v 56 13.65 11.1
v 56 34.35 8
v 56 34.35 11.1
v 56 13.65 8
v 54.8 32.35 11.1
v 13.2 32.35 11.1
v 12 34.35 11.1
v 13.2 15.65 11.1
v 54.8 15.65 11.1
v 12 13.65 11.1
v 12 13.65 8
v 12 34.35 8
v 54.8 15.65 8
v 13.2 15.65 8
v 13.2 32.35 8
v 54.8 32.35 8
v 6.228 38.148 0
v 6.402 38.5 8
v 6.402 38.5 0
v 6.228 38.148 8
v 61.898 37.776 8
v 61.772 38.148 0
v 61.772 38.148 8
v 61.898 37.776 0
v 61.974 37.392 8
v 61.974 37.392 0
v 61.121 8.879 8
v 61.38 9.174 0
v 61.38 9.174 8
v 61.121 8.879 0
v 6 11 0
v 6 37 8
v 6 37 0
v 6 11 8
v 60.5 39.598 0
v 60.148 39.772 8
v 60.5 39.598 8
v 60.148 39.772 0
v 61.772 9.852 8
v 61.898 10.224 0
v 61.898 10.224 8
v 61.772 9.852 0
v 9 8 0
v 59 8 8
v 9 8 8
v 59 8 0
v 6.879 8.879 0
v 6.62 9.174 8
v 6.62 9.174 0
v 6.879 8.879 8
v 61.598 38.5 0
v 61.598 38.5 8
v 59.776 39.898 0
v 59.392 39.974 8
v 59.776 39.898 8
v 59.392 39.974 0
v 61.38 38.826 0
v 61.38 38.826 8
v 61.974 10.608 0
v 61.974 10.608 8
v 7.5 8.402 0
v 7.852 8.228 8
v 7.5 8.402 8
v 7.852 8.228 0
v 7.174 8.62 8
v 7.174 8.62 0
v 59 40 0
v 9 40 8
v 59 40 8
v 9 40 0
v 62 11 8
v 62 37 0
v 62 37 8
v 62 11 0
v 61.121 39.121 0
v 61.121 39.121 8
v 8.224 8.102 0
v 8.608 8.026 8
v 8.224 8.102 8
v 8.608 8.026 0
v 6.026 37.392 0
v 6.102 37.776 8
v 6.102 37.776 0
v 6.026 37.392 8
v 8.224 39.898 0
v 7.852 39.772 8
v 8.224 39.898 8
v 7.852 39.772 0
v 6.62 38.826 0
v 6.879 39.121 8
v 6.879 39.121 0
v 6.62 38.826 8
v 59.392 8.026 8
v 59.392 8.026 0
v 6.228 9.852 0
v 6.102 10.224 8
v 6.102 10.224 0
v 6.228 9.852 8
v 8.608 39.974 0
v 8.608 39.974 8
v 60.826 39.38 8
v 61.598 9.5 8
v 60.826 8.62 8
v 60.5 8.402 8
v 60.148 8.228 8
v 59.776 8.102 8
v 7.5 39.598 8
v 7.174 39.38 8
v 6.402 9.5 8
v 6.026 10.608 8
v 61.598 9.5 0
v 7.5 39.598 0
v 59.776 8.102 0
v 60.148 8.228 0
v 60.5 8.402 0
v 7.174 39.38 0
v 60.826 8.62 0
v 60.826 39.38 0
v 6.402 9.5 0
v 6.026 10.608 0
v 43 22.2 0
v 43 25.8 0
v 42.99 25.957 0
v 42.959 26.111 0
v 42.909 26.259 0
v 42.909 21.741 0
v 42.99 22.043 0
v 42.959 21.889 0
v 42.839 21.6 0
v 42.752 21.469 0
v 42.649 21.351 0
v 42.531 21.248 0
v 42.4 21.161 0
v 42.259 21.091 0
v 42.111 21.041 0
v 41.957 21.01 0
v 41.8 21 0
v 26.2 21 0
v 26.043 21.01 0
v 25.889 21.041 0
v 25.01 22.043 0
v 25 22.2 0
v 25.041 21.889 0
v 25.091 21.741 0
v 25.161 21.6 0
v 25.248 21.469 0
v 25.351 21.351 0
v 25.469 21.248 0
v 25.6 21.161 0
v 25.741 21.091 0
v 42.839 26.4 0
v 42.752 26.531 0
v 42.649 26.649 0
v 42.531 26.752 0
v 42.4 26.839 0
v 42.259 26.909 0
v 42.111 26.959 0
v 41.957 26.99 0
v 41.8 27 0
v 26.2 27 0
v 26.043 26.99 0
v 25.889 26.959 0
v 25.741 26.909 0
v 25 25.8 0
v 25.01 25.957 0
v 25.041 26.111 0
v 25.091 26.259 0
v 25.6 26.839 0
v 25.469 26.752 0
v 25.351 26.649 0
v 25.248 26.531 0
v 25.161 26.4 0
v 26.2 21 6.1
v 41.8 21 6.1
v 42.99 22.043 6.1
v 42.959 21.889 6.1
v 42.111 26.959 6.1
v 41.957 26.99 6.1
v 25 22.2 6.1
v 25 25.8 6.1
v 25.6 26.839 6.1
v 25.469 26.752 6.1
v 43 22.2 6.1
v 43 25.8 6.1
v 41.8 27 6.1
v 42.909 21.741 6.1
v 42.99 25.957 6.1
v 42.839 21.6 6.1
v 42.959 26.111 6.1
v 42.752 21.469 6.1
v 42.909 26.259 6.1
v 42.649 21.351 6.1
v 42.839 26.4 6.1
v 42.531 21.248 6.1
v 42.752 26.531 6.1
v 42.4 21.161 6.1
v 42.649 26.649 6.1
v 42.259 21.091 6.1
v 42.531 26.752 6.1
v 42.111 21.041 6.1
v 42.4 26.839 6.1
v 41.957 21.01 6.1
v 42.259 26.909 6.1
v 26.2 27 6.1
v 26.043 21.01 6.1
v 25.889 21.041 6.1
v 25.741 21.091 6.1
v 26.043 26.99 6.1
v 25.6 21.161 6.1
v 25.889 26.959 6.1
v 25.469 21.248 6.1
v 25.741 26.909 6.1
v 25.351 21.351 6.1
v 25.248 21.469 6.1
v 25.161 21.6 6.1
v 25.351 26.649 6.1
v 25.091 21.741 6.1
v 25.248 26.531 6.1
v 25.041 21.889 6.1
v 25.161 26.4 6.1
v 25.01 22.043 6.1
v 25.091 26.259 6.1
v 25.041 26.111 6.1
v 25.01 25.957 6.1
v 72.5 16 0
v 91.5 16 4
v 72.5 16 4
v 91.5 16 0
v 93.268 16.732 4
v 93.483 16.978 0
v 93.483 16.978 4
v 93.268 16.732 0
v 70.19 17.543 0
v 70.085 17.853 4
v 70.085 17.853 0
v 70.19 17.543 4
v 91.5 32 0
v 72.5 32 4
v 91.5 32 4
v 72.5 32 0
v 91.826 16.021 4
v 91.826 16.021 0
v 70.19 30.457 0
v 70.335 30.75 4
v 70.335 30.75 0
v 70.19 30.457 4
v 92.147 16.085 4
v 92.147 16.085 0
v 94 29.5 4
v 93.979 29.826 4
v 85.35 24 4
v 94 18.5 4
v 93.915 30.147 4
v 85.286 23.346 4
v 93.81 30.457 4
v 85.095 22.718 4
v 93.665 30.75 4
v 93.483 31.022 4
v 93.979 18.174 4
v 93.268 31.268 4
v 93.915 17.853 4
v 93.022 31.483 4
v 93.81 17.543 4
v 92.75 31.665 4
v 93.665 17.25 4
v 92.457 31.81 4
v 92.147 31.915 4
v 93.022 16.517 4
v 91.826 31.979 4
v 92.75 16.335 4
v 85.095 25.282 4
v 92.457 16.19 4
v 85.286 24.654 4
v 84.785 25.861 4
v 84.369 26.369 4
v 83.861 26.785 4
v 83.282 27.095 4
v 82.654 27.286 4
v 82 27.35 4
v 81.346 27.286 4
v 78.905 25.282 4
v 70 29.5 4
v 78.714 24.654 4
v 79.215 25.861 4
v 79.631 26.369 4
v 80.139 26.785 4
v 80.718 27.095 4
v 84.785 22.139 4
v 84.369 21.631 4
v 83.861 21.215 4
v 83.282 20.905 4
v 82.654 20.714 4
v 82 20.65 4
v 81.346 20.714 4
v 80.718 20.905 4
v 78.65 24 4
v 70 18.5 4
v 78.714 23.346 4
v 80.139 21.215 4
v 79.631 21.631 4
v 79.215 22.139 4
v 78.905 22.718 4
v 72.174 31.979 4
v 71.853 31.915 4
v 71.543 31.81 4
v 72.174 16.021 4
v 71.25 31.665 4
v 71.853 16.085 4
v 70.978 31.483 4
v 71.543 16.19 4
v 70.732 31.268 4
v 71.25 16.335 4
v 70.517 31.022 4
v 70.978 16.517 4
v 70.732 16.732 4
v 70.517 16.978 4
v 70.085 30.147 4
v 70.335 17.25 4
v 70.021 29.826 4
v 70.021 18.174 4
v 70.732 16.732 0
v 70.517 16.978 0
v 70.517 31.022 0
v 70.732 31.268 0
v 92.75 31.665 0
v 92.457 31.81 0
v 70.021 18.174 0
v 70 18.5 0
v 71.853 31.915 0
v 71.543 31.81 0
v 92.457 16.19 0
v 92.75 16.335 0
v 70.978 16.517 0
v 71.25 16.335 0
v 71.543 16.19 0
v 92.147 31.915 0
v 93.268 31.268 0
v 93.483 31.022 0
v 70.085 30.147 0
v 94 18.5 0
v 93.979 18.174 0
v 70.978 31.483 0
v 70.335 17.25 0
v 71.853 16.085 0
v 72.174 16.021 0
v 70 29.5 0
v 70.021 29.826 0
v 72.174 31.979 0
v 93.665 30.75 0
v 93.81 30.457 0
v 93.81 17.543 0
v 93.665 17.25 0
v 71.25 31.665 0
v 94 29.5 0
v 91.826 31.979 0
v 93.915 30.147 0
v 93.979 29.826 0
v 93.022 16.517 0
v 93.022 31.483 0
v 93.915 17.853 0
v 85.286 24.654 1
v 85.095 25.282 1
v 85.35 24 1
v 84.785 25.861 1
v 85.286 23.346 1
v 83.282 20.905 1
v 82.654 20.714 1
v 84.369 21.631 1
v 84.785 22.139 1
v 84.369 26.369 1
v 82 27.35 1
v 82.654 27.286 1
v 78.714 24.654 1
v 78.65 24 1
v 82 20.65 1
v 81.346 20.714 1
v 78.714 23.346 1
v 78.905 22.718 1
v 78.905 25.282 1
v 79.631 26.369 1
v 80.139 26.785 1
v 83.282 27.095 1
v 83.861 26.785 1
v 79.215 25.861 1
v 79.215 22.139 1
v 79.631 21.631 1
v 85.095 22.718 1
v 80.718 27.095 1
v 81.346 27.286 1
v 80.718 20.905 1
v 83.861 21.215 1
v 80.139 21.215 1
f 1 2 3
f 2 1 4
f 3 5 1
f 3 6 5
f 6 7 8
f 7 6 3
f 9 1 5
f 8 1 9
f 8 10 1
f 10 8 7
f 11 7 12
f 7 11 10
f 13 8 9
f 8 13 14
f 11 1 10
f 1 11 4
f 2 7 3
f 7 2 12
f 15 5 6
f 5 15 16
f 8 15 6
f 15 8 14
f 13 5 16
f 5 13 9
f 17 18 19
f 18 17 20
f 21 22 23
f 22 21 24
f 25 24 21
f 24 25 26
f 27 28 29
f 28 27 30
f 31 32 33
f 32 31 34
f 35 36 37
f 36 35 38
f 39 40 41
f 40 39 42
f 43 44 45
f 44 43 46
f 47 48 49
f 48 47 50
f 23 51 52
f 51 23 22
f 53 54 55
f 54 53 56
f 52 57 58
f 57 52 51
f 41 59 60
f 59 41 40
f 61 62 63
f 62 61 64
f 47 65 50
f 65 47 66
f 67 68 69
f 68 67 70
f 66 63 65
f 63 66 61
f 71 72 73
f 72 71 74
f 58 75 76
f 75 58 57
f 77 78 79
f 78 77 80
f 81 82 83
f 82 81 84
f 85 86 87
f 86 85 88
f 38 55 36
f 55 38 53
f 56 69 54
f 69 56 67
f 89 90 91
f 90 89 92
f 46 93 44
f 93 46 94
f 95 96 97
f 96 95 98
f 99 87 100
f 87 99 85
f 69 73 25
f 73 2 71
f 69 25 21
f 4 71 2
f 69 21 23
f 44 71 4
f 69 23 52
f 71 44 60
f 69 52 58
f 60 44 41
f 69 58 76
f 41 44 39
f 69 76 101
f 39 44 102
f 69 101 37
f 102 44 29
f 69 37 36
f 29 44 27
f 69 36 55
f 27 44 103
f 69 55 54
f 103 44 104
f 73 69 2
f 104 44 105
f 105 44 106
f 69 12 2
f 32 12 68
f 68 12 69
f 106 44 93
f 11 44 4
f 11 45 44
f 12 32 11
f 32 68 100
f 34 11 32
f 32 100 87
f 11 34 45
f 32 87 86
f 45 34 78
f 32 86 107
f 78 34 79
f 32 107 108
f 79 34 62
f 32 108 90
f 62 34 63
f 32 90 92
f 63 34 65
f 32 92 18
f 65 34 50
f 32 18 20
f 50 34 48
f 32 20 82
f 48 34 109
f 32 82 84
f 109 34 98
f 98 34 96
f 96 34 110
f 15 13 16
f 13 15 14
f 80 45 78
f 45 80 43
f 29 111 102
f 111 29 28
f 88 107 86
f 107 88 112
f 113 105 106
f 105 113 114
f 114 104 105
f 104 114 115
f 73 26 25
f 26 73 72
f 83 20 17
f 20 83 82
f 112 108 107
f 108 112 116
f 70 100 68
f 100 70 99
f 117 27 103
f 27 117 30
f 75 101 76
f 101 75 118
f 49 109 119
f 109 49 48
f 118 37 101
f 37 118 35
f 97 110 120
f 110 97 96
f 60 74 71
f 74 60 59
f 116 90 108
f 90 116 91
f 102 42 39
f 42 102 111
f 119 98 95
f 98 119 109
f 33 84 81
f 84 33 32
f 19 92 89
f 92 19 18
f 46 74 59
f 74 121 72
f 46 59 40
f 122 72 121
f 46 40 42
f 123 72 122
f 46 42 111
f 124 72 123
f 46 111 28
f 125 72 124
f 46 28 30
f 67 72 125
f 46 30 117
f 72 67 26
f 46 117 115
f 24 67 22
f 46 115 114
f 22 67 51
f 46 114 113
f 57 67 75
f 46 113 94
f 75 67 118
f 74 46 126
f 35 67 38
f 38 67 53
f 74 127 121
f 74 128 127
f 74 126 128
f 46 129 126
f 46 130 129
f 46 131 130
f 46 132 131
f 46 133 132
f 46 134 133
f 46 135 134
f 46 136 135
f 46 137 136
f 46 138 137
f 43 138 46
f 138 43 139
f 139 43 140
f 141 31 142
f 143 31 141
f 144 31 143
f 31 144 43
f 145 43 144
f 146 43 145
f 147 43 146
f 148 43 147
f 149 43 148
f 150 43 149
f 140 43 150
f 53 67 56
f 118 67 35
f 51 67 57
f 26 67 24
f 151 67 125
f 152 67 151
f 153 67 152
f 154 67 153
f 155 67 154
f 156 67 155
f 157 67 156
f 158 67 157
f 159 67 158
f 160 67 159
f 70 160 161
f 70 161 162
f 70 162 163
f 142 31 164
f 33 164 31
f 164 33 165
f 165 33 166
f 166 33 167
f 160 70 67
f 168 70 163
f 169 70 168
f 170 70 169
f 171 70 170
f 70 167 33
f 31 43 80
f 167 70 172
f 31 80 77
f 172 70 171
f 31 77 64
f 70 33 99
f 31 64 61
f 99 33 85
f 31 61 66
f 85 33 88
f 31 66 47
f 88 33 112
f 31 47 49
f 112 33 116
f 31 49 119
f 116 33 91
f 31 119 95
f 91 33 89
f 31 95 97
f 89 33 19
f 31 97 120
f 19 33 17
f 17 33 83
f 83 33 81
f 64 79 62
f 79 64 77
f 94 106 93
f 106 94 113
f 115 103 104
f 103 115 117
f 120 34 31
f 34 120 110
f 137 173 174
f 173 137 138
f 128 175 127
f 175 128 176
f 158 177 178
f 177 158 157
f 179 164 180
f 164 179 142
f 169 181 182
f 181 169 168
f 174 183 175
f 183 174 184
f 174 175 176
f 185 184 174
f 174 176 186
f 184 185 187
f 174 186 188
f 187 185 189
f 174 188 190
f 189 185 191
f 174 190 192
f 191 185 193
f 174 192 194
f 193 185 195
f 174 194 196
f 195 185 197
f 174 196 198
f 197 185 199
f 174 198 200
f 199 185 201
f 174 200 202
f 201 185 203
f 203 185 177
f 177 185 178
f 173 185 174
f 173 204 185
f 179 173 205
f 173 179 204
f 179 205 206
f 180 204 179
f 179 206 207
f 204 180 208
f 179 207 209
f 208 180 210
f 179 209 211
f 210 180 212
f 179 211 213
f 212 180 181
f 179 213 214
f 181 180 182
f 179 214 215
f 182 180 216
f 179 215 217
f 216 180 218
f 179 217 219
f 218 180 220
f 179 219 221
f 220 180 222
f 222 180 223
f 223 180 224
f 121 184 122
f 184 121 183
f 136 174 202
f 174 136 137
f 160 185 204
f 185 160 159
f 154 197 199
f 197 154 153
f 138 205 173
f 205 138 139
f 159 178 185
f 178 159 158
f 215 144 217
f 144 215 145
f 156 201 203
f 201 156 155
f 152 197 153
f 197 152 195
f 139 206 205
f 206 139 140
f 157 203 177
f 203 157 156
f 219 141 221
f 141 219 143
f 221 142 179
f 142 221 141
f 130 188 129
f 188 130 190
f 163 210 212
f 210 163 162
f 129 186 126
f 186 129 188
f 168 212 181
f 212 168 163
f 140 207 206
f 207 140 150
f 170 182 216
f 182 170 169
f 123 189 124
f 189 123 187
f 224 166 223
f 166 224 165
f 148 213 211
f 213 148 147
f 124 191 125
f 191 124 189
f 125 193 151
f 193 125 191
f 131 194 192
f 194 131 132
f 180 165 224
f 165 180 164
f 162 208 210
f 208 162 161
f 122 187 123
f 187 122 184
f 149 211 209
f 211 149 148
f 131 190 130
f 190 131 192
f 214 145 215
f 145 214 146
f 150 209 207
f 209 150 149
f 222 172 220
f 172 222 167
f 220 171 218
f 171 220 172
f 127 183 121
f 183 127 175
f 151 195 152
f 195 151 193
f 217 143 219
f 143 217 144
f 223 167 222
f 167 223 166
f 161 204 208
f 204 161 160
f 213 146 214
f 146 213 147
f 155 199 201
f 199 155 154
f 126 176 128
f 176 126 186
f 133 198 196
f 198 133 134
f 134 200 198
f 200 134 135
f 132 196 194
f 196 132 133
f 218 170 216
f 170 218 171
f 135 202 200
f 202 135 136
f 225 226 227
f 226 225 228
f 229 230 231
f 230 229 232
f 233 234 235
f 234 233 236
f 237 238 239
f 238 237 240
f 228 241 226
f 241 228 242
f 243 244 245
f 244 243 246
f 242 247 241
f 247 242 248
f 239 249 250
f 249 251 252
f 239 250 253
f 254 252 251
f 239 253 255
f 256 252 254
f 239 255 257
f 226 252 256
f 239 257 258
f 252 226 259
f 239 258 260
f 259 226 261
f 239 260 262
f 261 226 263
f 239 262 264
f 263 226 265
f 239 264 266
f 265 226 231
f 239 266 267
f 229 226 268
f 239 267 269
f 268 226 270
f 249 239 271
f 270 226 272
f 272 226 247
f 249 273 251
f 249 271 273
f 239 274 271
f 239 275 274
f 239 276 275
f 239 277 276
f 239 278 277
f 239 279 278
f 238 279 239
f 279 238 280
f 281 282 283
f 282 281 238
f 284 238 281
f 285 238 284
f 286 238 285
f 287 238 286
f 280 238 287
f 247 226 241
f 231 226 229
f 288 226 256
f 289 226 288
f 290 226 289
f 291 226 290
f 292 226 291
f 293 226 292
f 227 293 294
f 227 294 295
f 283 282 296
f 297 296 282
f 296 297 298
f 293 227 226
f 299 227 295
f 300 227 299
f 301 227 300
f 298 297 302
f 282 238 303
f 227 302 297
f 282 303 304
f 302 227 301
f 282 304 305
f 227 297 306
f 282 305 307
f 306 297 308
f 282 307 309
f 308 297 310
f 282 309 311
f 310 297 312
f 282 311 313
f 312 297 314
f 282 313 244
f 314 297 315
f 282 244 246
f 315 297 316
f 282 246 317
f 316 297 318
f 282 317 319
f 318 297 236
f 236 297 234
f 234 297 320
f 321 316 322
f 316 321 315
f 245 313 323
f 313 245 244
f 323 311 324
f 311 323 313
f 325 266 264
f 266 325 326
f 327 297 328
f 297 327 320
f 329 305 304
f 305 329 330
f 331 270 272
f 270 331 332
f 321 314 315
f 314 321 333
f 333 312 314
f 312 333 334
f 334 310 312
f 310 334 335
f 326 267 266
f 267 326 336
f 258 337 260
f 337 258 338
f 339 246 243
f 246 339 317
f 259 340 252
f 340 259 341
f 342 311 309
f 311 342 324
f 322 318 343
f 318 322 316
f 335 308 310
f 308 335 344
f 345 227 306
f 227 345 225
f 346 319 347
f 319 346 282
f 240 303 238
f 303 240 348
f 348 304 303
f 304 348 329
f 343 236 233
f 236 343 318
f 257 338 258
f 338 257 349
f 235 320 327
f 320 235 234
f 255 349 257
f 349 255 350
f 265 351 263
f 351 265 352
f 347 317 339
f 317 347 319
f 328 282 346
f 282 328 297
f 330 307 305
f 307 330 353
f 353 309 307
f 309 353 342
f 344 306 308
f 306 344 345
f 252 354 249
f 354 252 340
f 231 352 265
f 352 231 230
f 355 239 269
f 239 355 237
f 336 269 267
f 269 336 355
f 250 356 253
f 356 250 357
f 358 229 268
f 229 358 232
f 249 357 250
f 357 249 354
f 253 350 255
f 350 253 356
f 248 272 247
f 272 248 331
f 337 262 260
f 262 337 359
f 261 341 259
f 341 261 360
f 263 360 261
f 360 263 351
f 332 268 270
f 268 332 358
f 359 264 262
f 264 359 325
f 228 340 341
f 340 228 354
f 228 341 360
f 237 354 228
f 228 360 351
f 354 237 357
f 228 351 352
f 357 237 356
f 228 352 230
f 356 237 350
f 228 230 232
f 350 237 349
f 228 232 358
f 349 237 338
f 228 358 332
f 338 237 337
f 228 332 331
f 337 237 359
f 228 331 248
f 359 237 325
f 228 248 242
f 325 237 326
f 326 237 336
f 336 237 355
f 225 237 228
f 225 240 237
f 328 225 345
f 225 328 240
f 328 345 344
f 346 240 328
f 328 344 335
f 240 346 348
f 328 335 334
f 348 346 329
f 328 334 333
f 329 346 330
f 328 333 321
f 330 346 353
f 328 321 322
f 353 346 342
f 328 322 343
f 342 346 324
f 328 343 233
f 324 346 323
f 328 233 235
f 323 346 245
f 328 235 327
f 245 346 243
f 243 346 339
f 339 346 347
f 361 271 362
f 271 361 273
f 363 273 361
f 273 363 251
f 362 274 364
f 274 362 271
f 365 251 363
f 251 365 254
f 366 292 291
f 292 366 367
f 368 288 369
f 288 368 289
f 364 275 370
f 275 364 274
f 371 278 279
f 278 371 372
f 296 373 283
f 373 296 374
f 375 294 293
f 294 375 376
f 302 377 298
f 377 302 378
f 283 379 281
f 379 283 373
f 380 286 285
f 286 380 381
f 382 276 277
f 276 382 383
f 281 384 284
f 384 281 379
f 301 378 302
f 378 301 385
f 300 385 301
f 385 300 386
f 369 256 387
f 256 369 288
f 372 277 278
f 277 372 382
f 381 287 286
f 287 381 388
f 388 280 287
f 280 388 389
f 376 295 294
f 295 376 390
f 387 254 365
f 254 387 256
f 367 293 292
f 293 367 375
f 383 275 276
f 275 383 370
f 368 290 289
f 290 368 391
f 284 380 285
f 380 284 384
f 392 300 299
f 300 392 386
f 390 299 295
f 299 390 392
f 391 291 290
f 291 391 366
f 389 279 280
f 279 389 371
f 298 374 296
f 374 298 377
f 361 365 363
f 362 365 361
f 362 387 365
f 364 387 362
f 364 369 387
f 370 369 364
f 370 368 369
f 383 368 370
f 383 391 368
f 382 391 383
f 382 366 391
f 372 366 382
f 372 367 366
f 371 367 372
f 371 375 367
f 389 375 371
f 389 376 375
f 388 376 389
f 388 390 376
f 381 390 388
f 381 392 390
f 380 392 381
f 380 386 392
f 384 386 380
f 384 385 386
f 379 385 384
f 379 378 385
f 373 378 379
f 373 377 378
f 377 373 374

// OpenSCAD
/*
Sample 154: Abgedichtete Magnetbetätiger-Tasche — Wand 2 mm
Generated from the FDM Mechanical Sample Library.
Units: millimetres.

Override examples:
  openscad -o custom.stl -D 'view="plate"' -D 'render_fn=64' model.scad
  openscad -o preview.png -D 'view="assembly"' model.scad
*/
use <../../../library/fdm_mechanisms.scad>

render_fn = is_undef(render_fn) ? 48 : render_fn;
view = is_undef(view) ? "plate" : view;
$fn = render_fn;

sample_magnetic_actuator(
    view=view,
    wall_t=2,
    magnet_d=6,
    magnet_l=3,
    switch_keepout=[18, 6, 6],
    travel=20,
    retention=1.2,
    clearance=0.35
);
